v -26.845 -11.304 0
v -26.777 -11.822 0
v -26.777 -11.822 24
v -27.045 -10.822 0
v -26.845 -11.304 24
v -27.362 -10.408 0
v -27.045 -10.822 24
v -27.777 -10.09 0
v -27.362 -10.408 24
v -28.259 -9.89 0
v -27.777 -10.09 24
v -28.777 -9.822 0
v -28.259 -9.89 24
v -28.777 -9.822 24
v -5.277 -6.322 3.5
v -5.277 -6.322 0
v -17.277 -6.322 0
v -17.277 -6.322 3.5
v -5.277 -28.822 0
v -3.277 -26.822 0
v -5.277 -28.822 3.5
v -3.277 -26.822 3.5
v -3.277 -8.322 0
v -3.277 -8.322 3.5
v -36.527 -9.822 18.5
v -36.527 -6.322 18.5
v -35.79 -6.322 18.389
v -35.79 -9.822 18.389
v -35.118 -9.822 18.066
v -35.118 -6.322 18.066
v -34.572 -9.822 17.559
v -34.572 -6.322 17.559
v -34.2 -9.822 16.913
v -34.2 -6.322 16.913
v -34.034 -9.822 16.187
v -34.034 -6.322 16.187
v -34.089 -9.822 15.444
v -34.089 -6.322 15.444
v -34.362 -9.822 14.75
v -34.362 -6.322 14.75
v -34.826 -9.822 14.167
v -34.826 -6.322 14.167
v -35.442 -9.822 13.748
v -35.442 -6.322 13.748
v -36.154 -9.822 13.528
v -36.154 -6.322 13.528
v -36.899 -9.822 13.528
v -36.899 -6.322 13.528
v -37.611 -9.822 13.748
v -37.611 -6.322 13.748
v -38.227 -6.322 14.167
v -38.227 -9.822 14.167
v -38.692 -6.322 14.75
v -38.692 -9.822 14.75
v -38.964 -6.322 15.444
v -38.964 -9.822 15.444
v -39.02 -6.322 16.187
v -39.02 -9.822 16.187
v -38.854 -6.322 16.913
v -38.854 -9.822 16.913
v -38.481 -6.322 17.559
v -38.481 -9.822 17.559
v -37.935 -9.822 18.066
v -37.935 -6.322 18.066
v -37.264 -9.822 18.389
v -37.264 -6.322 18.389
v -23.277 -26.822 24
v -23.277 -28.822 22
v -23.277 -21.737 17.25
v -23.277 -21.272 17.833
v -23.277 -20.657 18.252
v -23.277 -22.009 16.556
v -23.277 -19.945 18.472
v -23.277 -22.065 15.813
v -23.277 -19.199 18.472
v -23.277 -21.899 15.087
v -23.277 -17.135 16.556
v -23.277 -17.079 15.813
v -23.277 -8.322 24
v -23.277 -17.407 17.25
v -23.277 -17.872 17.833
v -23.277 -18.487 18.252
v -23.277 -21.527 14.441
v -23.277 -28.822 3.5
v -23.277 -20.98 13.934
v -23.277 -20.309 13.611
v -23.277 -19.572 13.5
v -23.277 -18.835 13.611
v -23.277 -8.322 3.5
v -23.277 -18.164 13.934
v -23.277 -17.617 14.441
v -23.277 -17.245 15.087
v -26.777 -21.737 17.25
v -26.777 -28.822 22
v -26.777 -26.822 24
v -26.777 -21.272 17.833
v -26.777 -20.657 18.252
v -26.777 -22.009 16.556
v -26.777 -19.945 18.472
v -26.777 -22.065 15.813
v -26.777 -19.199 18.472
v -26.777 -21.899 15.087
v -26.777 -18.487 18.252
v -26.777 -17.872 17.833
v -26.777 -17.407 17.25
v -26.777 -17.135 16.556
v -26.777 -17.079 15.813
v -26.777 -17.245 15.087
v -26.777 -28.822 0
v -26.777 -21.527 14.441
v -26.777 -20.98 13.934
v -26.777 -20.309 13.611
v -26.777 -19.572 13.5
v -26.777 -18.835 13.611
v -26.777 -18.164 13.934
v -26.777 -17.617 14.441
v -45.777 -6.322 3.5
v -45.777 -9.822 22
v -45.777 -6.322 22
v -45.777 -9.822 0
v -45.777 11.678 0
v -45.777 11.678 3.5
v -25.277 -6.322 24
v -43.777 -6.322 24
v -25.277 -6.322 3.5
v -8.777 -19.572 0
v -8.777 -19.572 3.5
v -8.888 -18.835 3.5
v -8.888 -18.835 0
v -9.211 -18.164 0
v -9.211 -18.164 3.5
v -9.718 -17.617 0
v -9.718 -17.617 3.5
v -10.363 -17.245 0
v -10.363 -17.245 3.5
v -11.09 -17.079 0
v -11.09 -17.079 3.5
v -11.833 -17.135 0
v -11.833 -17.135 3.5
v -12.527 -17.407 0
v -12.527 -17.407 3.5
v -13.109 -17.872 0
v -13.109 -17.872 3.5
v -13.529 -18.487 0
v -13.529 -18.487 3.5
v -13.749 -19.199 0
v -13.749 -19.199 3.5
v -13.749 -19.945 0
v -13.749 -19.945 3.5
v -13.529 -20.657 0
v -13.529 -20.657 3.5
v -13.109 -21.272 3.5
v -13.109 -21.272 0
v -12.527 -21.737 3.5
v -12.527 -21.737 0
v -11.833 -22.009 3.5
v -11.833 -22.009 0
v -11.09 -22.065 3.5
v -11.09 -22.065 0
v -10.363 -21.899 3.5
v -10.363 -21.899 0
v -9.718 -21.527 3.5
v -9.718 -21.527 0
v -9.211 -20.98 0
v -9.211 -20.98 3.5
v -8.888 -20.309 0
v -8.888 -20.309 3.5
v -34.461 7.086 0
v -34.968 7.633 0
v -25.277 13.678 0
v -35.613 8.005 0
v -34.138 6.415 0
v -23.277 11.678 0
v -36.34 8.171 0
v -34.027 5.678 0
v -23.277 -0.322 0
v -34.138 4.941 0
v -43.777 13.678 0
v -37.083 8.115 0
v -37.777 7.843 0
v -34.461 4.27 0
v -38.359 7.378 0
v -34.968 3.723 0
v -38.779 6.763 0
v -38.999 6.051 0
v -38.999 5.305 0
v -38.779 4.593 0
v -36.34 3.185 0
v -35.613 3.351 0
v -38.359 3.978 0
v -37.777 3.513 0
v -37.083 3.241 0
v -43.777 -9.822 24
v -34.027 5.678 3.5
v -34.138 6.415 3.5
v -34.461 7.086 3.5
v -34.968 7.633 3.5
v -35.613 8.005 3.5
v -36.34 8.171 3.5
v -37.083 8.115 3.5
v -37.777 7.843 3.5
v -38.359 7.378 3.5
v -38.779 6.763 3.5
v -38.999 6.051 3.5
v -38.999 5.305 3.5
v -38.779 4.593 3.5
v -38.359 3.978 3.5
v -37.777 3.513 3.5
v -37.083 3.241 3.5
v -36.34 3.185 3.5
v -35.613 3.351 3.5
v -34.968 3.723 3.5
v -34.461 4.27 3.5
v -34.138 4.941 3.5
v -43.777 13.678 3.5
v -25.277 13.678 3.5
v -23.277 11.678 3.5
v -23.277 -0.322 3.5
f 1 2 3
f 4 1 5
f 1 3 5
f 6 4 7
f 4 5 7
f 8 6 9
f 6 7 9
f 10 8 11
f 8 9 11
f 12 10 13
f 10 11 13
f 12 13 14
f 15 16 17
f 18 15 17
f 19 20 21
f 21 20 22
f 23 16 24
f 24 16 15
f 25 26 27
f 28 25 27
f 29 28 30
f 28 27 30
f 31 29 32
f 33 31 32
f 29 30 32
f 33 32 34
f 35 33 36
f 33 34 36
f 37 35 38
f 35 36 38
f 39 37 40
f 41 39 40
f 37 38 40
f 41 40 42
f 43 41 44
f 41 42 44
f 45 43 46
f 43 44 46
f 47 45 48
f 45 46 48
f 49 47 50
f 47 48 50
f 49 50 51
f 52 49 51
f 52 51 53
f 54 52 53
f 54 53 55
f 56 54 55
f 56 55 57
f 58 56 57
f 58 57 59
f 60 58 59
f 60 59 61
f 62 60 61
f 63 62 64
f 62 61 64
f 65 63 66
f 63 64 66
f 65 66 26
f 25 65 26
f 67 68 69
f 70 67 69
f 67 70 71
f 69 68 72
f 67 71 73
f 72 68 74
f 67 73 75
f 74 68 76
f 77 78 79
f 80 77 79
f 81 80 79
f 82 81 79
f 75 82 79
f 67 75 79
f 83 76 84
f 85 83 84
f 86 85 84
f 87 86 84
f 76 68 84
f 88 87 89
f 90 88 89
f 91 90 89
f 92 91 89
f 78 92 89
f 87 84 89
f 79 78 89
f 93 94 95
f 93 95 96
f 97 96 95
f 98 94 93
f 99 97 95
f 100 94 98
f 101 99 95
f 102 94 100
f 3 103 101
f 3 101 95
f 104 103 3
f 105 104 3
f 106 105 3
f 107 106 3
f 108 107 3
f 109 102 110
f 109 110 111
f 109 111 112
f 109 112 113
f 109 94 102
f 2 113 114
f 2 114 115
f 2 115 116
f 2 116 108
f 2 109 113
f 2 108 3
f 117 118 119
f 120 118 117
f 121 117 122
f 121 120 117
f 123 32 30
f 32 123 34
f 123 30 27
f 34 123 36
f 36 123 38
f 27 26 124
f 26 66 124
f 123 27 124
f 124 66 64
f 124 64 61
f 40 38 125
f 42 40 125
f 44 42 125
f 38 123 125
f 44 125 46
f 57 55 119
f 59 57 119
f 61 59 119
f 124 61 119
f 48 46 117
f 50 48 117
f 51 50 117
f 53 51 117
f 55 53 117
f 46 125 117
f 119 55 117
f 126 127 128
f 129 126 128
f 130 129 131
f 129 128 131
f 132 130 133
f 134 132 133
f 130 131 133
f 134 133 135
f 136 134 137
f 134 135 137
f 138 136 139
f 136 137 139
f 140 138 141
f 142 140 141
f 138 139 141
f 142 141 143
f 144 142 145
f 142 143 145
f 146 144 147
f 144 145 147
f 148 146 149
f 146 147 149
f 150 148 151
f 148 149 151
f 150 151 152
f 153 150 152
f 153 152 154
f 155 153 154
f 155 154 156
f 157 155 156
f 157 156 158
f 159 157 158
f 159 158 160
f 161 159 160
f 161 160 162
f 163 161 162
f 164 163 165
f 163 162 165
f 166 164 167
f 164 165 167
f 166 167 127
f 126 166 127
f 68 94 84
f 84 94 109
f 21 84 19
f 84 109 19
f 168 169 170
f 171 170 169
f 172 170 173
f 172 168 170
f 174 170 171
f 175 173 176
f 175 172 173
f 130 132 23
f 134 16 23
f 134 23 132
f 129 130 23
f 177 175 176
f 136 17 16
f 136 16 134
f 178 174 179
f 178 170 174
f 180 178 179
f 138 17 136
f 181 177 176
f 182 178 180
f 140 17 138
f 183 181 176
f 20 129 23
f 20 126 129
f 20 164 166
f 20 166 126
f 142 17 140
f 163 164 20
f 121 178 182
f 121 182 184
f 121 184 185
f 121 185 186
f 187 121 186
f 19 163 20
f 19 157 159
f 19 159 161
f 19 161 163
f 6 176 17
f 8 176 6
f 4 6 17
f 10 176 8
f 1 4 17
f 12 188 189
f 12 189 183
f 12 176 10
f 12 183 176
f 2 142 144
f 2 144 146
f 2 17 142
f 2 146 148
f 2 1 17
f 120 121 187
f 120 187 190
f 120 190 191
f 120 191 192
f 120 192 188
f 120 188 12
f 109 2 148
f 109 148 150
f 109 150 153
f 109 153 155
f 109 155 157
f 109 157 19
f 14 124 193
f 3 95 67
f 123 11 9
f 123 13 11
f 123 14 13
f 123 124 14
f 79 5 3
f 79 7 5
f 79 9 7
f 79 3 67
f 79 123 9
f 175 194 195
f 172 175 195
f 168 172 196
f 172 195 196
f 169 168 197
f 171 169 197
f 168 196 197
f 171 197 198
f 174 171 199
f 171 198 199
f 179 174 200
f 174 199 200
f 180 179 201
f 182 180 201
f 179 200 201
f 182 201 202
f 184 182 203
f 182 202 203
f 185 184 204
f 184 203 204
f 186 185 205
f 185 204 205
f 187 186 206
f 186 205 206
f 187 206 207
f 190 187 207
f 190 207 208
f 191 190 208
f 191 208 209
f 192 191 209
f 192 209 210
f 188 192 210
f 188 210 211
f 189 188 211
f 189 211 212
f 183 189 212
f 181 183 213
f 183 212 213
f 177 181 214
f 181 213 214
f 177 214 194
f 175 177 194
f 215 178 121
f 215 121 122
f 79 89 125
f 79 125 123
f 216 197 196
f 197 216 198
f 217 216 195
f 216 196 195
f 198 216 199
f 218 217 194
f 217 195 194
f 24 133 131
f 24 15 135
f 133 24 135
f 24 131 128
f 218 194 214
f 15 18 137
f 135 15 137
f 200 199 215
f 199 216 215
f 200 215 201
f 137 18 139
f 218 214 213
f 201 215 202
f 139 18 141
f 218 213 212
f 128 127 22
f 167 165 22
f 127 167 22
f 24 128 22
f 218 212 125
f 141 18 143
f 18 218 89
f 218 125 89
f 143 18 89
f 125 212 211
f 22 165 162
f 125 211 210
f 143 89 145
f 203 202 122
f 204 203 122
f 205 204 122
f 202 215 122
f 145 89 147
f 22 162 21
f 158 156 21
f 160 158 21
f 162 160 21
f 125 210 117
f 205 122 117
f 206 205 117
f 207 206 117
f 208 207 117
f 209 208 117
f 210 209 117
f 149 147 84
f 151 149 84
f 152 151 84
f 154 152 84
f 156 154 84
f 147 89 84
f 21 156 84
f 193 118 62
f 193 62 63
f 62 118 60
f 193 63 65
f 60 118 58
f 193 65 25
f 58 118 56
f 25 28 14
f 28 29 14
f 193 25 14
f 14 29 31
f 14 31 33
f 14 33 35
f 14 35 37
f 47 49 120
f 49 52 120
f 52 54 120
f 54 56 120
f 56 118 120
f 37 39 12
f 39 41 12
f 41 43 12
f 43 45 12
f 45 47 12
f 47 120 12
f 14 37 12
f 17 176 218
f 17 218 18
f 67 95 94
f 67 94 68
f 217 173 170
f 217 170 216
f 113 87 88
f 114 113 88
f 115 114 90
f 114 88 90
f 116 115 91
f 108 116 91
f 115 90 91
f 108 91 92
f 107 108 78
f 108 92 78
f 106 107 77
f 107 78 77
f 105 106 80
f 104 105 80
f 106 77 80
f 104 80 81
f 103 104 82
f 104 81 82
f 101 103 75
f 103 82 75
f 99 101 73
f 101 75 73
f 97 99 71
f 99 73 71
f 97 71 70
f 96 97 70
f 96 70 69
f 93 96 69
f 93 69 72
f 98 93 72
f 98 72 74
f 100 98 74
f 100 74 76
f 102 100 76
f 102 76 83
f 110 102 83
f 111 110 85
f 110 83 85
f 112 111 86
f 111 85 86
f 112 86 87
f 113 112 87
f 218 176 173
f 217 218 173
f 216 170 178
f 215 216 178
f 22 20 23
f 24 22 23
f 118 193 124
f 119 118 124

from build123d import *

# Parameters (mm, degrees)
ESQUISSE1_W             = 3.5
ESQUISSE1_H             = 3.5
BOSS_EXTRU_1_DEPTH      = 3.5
ESQUISSE2_W             = 19
ESQUISSE2_H             = 3.5
ESQUISSE2_W_2           = 3.5
ESQUISSE2_H_2           = 19
BOSS_EXTRU_2_DEPTH      = 20.5
ESQUISSE3_R             = 2.5
ENL_V_MAT_EXTRU_2_DEPTH = 3.5
ESQUISSE4_R             = 2.5
ENL_V_MAT_EXTRU_3_DEPTH = 3.5
ESQUISSE5_R             = 2.5
ENL_V_MAT_EXTRU_4_DEPTH = 3.5
ESQUISSE6_R             = 2.5
ENL_V_MAT_EXTRU_5_DEPTH = 3.5
CHANFREIN1_SIZE         = 6
CHANFREIN2_SIZE         = 2
CHANFREIN3_SIZE         = 2
CONG_1_R                = 2


with BuildPart() as part:
    # Esquisse1 → Boss.-Extru.1 (new body)
    with BuildSketch(Plane.XY):
        Polygon((-23.276688067, 13.678057554), (-45.776688067, 13.678057554), (-45.776688067, -9.821942446), (-26.776688067, -9.821942446), (-26.776688067, -6.321942446), (-23.276688067, -6.321942446), align=None)
        with Locations((-25.026688067, -8.071942446)):
            Rectangle(ESQUISSE1_W, ESQUISSE1_H)
        Polygon((-3.276688067, -6.321942446), (-23.276688067, -6.321942446), (-23.276688067, -9.821942446), (-26.776688067, -9.821942446), (-26.776688067, -28.821942446), (-3.276688067, -28.821942446), align=None)
    extrude(amount=BOSS_EXTRU_1_DEPTH)

    # Esquisse2 → Boss.-Extru.2 (add)
    with BuildSketch(Plane.XY.offset(3.5)):
        with Locations((-36.276688067, -8.071942446)):
            Rectangle(ESQUISSE2_W, ESQUISSE2_H)
        with Locations((-25.026688067, -8.071942446)):
            Rectangle(ESQUISSE2_W_2, ESQUISSE2_H)
        with Locations((-25.026688067, -19.321942446)):
            Rectangle(ESQUISSE2_W_2, ESQUISSE2_H_2)
    extrude(amount=BOSS_EXTRU_2_DEPTH)

    # Esquisse3 → Enlèv. mat.-Extru.2 (cut)
    with BuildSketch(Plane(origin=(0, -6.321942446, 0), x_dir=(1, 0, 0), z_dir=(0, 1, 0))):
        with Locations(Location((-36.526688067, -16, 0), (0, 0, 270))):
            Circle(ESQUISSE3_R)
    extrude(amount=-ENL_V_MAT_EXTRU_2_DEPTH, mode=Mode.SUBTRACT)

    # Esquisse4 → Enlèv. mat.-Extru.3 (cut)
    with BuildSketch(Plane(origin=(-23.276688067, 0, 0), x_dir=(0, 0, -1), z_dir=(1, 0, 0))):
        with Locations((-16, -19.571942446)):
            Circle(ESQUISSE4_R)
    extrude(amount=-ENL_V_MAT_EXTRU_3_DEPTH, mode=Mode.SUBTRACT)

    # Esquisse5 → Enlèv. mat.-Extru.4 (cut)
    with BuildSketch(Plane.XY.offset(3.5)):
        with Locations((-36.526688067, 5.678057554)):
            Circle(ESQUISSE5_R)
    extrude(amount=-ENL_V_MAT_EXTRU_4_DEPTH, mode=Mode.SUBTRACT)

    # Esquisse6 → Enlèv. mat.-Extru.5 (cut)
    with BuildSketch(Plane.XY.offset(3.5)):
        with Locations((-11.276688067, -19.571942446)):
            Circle(ESQUISSE6_R)
    extrude(amount=-ENL_V_MAT_EXTRU_5_DEPTH, mode=Mode.SUBTRACT)

    # Chanfrein1
    # the kernel refuses this chamfer: 6 mm, written as the material it adds along each edge
    with BuildSketch(Plane(origin=(-23.276688067, -6.321942446, 0), x_dir=(-0.027495876610586202, 0.9996219169112968, 0), z_dir=(0, 0, 1))) as chanfrein1_piece_1:
        Polygon((CHANFREIN1_SIZE * 0.999621916911, -CHANFREIN1_SIZE * 0.0274958766106), (-CHANFREIN1_SIZE * 0.0274958766106, -CHANFREIN1_SIZE * 0.999621916911), (0, 0), align=None)
    extrude(amount=3.5)

    # Chanfrein2
    chanfrein2_edges = [part.edges().sort_by_distance(p)[0] for p in [
        (-23.276688067, -6.321942446, 13.75),
    ]]
    chamfer(chanfrein2_edges, length=CHANFREIN2_SIZE)

    # Chanfrein3
    chanfrein3_edges = [part.edges().sort_by_distance(p)[0] for p in [
        (-45.776688067, 13.678057554, 1.75),
        (-23.276688067, 13.678057554, 1.75),
        (-3.276688067, -6.321942446, 1.75),
        (-3.276688067, -28.821942446, 1.75),
        (-25.026688067, -28.821942446, 24),
        (-45.776688067, -8.071942446, 24),
    ]]
    chamfer(chanfrein3_edges, length=CHANFREIN3_SIZE)

    # Congé1
    cong_1_edges = [part.edges().sort_by_distance(p)[0] for p in [
        (-26.776688067, -9.821942446, 12),
    ]]
    fillet(cong_1_edges, radius=CONG_1_R)


solid = part.part
